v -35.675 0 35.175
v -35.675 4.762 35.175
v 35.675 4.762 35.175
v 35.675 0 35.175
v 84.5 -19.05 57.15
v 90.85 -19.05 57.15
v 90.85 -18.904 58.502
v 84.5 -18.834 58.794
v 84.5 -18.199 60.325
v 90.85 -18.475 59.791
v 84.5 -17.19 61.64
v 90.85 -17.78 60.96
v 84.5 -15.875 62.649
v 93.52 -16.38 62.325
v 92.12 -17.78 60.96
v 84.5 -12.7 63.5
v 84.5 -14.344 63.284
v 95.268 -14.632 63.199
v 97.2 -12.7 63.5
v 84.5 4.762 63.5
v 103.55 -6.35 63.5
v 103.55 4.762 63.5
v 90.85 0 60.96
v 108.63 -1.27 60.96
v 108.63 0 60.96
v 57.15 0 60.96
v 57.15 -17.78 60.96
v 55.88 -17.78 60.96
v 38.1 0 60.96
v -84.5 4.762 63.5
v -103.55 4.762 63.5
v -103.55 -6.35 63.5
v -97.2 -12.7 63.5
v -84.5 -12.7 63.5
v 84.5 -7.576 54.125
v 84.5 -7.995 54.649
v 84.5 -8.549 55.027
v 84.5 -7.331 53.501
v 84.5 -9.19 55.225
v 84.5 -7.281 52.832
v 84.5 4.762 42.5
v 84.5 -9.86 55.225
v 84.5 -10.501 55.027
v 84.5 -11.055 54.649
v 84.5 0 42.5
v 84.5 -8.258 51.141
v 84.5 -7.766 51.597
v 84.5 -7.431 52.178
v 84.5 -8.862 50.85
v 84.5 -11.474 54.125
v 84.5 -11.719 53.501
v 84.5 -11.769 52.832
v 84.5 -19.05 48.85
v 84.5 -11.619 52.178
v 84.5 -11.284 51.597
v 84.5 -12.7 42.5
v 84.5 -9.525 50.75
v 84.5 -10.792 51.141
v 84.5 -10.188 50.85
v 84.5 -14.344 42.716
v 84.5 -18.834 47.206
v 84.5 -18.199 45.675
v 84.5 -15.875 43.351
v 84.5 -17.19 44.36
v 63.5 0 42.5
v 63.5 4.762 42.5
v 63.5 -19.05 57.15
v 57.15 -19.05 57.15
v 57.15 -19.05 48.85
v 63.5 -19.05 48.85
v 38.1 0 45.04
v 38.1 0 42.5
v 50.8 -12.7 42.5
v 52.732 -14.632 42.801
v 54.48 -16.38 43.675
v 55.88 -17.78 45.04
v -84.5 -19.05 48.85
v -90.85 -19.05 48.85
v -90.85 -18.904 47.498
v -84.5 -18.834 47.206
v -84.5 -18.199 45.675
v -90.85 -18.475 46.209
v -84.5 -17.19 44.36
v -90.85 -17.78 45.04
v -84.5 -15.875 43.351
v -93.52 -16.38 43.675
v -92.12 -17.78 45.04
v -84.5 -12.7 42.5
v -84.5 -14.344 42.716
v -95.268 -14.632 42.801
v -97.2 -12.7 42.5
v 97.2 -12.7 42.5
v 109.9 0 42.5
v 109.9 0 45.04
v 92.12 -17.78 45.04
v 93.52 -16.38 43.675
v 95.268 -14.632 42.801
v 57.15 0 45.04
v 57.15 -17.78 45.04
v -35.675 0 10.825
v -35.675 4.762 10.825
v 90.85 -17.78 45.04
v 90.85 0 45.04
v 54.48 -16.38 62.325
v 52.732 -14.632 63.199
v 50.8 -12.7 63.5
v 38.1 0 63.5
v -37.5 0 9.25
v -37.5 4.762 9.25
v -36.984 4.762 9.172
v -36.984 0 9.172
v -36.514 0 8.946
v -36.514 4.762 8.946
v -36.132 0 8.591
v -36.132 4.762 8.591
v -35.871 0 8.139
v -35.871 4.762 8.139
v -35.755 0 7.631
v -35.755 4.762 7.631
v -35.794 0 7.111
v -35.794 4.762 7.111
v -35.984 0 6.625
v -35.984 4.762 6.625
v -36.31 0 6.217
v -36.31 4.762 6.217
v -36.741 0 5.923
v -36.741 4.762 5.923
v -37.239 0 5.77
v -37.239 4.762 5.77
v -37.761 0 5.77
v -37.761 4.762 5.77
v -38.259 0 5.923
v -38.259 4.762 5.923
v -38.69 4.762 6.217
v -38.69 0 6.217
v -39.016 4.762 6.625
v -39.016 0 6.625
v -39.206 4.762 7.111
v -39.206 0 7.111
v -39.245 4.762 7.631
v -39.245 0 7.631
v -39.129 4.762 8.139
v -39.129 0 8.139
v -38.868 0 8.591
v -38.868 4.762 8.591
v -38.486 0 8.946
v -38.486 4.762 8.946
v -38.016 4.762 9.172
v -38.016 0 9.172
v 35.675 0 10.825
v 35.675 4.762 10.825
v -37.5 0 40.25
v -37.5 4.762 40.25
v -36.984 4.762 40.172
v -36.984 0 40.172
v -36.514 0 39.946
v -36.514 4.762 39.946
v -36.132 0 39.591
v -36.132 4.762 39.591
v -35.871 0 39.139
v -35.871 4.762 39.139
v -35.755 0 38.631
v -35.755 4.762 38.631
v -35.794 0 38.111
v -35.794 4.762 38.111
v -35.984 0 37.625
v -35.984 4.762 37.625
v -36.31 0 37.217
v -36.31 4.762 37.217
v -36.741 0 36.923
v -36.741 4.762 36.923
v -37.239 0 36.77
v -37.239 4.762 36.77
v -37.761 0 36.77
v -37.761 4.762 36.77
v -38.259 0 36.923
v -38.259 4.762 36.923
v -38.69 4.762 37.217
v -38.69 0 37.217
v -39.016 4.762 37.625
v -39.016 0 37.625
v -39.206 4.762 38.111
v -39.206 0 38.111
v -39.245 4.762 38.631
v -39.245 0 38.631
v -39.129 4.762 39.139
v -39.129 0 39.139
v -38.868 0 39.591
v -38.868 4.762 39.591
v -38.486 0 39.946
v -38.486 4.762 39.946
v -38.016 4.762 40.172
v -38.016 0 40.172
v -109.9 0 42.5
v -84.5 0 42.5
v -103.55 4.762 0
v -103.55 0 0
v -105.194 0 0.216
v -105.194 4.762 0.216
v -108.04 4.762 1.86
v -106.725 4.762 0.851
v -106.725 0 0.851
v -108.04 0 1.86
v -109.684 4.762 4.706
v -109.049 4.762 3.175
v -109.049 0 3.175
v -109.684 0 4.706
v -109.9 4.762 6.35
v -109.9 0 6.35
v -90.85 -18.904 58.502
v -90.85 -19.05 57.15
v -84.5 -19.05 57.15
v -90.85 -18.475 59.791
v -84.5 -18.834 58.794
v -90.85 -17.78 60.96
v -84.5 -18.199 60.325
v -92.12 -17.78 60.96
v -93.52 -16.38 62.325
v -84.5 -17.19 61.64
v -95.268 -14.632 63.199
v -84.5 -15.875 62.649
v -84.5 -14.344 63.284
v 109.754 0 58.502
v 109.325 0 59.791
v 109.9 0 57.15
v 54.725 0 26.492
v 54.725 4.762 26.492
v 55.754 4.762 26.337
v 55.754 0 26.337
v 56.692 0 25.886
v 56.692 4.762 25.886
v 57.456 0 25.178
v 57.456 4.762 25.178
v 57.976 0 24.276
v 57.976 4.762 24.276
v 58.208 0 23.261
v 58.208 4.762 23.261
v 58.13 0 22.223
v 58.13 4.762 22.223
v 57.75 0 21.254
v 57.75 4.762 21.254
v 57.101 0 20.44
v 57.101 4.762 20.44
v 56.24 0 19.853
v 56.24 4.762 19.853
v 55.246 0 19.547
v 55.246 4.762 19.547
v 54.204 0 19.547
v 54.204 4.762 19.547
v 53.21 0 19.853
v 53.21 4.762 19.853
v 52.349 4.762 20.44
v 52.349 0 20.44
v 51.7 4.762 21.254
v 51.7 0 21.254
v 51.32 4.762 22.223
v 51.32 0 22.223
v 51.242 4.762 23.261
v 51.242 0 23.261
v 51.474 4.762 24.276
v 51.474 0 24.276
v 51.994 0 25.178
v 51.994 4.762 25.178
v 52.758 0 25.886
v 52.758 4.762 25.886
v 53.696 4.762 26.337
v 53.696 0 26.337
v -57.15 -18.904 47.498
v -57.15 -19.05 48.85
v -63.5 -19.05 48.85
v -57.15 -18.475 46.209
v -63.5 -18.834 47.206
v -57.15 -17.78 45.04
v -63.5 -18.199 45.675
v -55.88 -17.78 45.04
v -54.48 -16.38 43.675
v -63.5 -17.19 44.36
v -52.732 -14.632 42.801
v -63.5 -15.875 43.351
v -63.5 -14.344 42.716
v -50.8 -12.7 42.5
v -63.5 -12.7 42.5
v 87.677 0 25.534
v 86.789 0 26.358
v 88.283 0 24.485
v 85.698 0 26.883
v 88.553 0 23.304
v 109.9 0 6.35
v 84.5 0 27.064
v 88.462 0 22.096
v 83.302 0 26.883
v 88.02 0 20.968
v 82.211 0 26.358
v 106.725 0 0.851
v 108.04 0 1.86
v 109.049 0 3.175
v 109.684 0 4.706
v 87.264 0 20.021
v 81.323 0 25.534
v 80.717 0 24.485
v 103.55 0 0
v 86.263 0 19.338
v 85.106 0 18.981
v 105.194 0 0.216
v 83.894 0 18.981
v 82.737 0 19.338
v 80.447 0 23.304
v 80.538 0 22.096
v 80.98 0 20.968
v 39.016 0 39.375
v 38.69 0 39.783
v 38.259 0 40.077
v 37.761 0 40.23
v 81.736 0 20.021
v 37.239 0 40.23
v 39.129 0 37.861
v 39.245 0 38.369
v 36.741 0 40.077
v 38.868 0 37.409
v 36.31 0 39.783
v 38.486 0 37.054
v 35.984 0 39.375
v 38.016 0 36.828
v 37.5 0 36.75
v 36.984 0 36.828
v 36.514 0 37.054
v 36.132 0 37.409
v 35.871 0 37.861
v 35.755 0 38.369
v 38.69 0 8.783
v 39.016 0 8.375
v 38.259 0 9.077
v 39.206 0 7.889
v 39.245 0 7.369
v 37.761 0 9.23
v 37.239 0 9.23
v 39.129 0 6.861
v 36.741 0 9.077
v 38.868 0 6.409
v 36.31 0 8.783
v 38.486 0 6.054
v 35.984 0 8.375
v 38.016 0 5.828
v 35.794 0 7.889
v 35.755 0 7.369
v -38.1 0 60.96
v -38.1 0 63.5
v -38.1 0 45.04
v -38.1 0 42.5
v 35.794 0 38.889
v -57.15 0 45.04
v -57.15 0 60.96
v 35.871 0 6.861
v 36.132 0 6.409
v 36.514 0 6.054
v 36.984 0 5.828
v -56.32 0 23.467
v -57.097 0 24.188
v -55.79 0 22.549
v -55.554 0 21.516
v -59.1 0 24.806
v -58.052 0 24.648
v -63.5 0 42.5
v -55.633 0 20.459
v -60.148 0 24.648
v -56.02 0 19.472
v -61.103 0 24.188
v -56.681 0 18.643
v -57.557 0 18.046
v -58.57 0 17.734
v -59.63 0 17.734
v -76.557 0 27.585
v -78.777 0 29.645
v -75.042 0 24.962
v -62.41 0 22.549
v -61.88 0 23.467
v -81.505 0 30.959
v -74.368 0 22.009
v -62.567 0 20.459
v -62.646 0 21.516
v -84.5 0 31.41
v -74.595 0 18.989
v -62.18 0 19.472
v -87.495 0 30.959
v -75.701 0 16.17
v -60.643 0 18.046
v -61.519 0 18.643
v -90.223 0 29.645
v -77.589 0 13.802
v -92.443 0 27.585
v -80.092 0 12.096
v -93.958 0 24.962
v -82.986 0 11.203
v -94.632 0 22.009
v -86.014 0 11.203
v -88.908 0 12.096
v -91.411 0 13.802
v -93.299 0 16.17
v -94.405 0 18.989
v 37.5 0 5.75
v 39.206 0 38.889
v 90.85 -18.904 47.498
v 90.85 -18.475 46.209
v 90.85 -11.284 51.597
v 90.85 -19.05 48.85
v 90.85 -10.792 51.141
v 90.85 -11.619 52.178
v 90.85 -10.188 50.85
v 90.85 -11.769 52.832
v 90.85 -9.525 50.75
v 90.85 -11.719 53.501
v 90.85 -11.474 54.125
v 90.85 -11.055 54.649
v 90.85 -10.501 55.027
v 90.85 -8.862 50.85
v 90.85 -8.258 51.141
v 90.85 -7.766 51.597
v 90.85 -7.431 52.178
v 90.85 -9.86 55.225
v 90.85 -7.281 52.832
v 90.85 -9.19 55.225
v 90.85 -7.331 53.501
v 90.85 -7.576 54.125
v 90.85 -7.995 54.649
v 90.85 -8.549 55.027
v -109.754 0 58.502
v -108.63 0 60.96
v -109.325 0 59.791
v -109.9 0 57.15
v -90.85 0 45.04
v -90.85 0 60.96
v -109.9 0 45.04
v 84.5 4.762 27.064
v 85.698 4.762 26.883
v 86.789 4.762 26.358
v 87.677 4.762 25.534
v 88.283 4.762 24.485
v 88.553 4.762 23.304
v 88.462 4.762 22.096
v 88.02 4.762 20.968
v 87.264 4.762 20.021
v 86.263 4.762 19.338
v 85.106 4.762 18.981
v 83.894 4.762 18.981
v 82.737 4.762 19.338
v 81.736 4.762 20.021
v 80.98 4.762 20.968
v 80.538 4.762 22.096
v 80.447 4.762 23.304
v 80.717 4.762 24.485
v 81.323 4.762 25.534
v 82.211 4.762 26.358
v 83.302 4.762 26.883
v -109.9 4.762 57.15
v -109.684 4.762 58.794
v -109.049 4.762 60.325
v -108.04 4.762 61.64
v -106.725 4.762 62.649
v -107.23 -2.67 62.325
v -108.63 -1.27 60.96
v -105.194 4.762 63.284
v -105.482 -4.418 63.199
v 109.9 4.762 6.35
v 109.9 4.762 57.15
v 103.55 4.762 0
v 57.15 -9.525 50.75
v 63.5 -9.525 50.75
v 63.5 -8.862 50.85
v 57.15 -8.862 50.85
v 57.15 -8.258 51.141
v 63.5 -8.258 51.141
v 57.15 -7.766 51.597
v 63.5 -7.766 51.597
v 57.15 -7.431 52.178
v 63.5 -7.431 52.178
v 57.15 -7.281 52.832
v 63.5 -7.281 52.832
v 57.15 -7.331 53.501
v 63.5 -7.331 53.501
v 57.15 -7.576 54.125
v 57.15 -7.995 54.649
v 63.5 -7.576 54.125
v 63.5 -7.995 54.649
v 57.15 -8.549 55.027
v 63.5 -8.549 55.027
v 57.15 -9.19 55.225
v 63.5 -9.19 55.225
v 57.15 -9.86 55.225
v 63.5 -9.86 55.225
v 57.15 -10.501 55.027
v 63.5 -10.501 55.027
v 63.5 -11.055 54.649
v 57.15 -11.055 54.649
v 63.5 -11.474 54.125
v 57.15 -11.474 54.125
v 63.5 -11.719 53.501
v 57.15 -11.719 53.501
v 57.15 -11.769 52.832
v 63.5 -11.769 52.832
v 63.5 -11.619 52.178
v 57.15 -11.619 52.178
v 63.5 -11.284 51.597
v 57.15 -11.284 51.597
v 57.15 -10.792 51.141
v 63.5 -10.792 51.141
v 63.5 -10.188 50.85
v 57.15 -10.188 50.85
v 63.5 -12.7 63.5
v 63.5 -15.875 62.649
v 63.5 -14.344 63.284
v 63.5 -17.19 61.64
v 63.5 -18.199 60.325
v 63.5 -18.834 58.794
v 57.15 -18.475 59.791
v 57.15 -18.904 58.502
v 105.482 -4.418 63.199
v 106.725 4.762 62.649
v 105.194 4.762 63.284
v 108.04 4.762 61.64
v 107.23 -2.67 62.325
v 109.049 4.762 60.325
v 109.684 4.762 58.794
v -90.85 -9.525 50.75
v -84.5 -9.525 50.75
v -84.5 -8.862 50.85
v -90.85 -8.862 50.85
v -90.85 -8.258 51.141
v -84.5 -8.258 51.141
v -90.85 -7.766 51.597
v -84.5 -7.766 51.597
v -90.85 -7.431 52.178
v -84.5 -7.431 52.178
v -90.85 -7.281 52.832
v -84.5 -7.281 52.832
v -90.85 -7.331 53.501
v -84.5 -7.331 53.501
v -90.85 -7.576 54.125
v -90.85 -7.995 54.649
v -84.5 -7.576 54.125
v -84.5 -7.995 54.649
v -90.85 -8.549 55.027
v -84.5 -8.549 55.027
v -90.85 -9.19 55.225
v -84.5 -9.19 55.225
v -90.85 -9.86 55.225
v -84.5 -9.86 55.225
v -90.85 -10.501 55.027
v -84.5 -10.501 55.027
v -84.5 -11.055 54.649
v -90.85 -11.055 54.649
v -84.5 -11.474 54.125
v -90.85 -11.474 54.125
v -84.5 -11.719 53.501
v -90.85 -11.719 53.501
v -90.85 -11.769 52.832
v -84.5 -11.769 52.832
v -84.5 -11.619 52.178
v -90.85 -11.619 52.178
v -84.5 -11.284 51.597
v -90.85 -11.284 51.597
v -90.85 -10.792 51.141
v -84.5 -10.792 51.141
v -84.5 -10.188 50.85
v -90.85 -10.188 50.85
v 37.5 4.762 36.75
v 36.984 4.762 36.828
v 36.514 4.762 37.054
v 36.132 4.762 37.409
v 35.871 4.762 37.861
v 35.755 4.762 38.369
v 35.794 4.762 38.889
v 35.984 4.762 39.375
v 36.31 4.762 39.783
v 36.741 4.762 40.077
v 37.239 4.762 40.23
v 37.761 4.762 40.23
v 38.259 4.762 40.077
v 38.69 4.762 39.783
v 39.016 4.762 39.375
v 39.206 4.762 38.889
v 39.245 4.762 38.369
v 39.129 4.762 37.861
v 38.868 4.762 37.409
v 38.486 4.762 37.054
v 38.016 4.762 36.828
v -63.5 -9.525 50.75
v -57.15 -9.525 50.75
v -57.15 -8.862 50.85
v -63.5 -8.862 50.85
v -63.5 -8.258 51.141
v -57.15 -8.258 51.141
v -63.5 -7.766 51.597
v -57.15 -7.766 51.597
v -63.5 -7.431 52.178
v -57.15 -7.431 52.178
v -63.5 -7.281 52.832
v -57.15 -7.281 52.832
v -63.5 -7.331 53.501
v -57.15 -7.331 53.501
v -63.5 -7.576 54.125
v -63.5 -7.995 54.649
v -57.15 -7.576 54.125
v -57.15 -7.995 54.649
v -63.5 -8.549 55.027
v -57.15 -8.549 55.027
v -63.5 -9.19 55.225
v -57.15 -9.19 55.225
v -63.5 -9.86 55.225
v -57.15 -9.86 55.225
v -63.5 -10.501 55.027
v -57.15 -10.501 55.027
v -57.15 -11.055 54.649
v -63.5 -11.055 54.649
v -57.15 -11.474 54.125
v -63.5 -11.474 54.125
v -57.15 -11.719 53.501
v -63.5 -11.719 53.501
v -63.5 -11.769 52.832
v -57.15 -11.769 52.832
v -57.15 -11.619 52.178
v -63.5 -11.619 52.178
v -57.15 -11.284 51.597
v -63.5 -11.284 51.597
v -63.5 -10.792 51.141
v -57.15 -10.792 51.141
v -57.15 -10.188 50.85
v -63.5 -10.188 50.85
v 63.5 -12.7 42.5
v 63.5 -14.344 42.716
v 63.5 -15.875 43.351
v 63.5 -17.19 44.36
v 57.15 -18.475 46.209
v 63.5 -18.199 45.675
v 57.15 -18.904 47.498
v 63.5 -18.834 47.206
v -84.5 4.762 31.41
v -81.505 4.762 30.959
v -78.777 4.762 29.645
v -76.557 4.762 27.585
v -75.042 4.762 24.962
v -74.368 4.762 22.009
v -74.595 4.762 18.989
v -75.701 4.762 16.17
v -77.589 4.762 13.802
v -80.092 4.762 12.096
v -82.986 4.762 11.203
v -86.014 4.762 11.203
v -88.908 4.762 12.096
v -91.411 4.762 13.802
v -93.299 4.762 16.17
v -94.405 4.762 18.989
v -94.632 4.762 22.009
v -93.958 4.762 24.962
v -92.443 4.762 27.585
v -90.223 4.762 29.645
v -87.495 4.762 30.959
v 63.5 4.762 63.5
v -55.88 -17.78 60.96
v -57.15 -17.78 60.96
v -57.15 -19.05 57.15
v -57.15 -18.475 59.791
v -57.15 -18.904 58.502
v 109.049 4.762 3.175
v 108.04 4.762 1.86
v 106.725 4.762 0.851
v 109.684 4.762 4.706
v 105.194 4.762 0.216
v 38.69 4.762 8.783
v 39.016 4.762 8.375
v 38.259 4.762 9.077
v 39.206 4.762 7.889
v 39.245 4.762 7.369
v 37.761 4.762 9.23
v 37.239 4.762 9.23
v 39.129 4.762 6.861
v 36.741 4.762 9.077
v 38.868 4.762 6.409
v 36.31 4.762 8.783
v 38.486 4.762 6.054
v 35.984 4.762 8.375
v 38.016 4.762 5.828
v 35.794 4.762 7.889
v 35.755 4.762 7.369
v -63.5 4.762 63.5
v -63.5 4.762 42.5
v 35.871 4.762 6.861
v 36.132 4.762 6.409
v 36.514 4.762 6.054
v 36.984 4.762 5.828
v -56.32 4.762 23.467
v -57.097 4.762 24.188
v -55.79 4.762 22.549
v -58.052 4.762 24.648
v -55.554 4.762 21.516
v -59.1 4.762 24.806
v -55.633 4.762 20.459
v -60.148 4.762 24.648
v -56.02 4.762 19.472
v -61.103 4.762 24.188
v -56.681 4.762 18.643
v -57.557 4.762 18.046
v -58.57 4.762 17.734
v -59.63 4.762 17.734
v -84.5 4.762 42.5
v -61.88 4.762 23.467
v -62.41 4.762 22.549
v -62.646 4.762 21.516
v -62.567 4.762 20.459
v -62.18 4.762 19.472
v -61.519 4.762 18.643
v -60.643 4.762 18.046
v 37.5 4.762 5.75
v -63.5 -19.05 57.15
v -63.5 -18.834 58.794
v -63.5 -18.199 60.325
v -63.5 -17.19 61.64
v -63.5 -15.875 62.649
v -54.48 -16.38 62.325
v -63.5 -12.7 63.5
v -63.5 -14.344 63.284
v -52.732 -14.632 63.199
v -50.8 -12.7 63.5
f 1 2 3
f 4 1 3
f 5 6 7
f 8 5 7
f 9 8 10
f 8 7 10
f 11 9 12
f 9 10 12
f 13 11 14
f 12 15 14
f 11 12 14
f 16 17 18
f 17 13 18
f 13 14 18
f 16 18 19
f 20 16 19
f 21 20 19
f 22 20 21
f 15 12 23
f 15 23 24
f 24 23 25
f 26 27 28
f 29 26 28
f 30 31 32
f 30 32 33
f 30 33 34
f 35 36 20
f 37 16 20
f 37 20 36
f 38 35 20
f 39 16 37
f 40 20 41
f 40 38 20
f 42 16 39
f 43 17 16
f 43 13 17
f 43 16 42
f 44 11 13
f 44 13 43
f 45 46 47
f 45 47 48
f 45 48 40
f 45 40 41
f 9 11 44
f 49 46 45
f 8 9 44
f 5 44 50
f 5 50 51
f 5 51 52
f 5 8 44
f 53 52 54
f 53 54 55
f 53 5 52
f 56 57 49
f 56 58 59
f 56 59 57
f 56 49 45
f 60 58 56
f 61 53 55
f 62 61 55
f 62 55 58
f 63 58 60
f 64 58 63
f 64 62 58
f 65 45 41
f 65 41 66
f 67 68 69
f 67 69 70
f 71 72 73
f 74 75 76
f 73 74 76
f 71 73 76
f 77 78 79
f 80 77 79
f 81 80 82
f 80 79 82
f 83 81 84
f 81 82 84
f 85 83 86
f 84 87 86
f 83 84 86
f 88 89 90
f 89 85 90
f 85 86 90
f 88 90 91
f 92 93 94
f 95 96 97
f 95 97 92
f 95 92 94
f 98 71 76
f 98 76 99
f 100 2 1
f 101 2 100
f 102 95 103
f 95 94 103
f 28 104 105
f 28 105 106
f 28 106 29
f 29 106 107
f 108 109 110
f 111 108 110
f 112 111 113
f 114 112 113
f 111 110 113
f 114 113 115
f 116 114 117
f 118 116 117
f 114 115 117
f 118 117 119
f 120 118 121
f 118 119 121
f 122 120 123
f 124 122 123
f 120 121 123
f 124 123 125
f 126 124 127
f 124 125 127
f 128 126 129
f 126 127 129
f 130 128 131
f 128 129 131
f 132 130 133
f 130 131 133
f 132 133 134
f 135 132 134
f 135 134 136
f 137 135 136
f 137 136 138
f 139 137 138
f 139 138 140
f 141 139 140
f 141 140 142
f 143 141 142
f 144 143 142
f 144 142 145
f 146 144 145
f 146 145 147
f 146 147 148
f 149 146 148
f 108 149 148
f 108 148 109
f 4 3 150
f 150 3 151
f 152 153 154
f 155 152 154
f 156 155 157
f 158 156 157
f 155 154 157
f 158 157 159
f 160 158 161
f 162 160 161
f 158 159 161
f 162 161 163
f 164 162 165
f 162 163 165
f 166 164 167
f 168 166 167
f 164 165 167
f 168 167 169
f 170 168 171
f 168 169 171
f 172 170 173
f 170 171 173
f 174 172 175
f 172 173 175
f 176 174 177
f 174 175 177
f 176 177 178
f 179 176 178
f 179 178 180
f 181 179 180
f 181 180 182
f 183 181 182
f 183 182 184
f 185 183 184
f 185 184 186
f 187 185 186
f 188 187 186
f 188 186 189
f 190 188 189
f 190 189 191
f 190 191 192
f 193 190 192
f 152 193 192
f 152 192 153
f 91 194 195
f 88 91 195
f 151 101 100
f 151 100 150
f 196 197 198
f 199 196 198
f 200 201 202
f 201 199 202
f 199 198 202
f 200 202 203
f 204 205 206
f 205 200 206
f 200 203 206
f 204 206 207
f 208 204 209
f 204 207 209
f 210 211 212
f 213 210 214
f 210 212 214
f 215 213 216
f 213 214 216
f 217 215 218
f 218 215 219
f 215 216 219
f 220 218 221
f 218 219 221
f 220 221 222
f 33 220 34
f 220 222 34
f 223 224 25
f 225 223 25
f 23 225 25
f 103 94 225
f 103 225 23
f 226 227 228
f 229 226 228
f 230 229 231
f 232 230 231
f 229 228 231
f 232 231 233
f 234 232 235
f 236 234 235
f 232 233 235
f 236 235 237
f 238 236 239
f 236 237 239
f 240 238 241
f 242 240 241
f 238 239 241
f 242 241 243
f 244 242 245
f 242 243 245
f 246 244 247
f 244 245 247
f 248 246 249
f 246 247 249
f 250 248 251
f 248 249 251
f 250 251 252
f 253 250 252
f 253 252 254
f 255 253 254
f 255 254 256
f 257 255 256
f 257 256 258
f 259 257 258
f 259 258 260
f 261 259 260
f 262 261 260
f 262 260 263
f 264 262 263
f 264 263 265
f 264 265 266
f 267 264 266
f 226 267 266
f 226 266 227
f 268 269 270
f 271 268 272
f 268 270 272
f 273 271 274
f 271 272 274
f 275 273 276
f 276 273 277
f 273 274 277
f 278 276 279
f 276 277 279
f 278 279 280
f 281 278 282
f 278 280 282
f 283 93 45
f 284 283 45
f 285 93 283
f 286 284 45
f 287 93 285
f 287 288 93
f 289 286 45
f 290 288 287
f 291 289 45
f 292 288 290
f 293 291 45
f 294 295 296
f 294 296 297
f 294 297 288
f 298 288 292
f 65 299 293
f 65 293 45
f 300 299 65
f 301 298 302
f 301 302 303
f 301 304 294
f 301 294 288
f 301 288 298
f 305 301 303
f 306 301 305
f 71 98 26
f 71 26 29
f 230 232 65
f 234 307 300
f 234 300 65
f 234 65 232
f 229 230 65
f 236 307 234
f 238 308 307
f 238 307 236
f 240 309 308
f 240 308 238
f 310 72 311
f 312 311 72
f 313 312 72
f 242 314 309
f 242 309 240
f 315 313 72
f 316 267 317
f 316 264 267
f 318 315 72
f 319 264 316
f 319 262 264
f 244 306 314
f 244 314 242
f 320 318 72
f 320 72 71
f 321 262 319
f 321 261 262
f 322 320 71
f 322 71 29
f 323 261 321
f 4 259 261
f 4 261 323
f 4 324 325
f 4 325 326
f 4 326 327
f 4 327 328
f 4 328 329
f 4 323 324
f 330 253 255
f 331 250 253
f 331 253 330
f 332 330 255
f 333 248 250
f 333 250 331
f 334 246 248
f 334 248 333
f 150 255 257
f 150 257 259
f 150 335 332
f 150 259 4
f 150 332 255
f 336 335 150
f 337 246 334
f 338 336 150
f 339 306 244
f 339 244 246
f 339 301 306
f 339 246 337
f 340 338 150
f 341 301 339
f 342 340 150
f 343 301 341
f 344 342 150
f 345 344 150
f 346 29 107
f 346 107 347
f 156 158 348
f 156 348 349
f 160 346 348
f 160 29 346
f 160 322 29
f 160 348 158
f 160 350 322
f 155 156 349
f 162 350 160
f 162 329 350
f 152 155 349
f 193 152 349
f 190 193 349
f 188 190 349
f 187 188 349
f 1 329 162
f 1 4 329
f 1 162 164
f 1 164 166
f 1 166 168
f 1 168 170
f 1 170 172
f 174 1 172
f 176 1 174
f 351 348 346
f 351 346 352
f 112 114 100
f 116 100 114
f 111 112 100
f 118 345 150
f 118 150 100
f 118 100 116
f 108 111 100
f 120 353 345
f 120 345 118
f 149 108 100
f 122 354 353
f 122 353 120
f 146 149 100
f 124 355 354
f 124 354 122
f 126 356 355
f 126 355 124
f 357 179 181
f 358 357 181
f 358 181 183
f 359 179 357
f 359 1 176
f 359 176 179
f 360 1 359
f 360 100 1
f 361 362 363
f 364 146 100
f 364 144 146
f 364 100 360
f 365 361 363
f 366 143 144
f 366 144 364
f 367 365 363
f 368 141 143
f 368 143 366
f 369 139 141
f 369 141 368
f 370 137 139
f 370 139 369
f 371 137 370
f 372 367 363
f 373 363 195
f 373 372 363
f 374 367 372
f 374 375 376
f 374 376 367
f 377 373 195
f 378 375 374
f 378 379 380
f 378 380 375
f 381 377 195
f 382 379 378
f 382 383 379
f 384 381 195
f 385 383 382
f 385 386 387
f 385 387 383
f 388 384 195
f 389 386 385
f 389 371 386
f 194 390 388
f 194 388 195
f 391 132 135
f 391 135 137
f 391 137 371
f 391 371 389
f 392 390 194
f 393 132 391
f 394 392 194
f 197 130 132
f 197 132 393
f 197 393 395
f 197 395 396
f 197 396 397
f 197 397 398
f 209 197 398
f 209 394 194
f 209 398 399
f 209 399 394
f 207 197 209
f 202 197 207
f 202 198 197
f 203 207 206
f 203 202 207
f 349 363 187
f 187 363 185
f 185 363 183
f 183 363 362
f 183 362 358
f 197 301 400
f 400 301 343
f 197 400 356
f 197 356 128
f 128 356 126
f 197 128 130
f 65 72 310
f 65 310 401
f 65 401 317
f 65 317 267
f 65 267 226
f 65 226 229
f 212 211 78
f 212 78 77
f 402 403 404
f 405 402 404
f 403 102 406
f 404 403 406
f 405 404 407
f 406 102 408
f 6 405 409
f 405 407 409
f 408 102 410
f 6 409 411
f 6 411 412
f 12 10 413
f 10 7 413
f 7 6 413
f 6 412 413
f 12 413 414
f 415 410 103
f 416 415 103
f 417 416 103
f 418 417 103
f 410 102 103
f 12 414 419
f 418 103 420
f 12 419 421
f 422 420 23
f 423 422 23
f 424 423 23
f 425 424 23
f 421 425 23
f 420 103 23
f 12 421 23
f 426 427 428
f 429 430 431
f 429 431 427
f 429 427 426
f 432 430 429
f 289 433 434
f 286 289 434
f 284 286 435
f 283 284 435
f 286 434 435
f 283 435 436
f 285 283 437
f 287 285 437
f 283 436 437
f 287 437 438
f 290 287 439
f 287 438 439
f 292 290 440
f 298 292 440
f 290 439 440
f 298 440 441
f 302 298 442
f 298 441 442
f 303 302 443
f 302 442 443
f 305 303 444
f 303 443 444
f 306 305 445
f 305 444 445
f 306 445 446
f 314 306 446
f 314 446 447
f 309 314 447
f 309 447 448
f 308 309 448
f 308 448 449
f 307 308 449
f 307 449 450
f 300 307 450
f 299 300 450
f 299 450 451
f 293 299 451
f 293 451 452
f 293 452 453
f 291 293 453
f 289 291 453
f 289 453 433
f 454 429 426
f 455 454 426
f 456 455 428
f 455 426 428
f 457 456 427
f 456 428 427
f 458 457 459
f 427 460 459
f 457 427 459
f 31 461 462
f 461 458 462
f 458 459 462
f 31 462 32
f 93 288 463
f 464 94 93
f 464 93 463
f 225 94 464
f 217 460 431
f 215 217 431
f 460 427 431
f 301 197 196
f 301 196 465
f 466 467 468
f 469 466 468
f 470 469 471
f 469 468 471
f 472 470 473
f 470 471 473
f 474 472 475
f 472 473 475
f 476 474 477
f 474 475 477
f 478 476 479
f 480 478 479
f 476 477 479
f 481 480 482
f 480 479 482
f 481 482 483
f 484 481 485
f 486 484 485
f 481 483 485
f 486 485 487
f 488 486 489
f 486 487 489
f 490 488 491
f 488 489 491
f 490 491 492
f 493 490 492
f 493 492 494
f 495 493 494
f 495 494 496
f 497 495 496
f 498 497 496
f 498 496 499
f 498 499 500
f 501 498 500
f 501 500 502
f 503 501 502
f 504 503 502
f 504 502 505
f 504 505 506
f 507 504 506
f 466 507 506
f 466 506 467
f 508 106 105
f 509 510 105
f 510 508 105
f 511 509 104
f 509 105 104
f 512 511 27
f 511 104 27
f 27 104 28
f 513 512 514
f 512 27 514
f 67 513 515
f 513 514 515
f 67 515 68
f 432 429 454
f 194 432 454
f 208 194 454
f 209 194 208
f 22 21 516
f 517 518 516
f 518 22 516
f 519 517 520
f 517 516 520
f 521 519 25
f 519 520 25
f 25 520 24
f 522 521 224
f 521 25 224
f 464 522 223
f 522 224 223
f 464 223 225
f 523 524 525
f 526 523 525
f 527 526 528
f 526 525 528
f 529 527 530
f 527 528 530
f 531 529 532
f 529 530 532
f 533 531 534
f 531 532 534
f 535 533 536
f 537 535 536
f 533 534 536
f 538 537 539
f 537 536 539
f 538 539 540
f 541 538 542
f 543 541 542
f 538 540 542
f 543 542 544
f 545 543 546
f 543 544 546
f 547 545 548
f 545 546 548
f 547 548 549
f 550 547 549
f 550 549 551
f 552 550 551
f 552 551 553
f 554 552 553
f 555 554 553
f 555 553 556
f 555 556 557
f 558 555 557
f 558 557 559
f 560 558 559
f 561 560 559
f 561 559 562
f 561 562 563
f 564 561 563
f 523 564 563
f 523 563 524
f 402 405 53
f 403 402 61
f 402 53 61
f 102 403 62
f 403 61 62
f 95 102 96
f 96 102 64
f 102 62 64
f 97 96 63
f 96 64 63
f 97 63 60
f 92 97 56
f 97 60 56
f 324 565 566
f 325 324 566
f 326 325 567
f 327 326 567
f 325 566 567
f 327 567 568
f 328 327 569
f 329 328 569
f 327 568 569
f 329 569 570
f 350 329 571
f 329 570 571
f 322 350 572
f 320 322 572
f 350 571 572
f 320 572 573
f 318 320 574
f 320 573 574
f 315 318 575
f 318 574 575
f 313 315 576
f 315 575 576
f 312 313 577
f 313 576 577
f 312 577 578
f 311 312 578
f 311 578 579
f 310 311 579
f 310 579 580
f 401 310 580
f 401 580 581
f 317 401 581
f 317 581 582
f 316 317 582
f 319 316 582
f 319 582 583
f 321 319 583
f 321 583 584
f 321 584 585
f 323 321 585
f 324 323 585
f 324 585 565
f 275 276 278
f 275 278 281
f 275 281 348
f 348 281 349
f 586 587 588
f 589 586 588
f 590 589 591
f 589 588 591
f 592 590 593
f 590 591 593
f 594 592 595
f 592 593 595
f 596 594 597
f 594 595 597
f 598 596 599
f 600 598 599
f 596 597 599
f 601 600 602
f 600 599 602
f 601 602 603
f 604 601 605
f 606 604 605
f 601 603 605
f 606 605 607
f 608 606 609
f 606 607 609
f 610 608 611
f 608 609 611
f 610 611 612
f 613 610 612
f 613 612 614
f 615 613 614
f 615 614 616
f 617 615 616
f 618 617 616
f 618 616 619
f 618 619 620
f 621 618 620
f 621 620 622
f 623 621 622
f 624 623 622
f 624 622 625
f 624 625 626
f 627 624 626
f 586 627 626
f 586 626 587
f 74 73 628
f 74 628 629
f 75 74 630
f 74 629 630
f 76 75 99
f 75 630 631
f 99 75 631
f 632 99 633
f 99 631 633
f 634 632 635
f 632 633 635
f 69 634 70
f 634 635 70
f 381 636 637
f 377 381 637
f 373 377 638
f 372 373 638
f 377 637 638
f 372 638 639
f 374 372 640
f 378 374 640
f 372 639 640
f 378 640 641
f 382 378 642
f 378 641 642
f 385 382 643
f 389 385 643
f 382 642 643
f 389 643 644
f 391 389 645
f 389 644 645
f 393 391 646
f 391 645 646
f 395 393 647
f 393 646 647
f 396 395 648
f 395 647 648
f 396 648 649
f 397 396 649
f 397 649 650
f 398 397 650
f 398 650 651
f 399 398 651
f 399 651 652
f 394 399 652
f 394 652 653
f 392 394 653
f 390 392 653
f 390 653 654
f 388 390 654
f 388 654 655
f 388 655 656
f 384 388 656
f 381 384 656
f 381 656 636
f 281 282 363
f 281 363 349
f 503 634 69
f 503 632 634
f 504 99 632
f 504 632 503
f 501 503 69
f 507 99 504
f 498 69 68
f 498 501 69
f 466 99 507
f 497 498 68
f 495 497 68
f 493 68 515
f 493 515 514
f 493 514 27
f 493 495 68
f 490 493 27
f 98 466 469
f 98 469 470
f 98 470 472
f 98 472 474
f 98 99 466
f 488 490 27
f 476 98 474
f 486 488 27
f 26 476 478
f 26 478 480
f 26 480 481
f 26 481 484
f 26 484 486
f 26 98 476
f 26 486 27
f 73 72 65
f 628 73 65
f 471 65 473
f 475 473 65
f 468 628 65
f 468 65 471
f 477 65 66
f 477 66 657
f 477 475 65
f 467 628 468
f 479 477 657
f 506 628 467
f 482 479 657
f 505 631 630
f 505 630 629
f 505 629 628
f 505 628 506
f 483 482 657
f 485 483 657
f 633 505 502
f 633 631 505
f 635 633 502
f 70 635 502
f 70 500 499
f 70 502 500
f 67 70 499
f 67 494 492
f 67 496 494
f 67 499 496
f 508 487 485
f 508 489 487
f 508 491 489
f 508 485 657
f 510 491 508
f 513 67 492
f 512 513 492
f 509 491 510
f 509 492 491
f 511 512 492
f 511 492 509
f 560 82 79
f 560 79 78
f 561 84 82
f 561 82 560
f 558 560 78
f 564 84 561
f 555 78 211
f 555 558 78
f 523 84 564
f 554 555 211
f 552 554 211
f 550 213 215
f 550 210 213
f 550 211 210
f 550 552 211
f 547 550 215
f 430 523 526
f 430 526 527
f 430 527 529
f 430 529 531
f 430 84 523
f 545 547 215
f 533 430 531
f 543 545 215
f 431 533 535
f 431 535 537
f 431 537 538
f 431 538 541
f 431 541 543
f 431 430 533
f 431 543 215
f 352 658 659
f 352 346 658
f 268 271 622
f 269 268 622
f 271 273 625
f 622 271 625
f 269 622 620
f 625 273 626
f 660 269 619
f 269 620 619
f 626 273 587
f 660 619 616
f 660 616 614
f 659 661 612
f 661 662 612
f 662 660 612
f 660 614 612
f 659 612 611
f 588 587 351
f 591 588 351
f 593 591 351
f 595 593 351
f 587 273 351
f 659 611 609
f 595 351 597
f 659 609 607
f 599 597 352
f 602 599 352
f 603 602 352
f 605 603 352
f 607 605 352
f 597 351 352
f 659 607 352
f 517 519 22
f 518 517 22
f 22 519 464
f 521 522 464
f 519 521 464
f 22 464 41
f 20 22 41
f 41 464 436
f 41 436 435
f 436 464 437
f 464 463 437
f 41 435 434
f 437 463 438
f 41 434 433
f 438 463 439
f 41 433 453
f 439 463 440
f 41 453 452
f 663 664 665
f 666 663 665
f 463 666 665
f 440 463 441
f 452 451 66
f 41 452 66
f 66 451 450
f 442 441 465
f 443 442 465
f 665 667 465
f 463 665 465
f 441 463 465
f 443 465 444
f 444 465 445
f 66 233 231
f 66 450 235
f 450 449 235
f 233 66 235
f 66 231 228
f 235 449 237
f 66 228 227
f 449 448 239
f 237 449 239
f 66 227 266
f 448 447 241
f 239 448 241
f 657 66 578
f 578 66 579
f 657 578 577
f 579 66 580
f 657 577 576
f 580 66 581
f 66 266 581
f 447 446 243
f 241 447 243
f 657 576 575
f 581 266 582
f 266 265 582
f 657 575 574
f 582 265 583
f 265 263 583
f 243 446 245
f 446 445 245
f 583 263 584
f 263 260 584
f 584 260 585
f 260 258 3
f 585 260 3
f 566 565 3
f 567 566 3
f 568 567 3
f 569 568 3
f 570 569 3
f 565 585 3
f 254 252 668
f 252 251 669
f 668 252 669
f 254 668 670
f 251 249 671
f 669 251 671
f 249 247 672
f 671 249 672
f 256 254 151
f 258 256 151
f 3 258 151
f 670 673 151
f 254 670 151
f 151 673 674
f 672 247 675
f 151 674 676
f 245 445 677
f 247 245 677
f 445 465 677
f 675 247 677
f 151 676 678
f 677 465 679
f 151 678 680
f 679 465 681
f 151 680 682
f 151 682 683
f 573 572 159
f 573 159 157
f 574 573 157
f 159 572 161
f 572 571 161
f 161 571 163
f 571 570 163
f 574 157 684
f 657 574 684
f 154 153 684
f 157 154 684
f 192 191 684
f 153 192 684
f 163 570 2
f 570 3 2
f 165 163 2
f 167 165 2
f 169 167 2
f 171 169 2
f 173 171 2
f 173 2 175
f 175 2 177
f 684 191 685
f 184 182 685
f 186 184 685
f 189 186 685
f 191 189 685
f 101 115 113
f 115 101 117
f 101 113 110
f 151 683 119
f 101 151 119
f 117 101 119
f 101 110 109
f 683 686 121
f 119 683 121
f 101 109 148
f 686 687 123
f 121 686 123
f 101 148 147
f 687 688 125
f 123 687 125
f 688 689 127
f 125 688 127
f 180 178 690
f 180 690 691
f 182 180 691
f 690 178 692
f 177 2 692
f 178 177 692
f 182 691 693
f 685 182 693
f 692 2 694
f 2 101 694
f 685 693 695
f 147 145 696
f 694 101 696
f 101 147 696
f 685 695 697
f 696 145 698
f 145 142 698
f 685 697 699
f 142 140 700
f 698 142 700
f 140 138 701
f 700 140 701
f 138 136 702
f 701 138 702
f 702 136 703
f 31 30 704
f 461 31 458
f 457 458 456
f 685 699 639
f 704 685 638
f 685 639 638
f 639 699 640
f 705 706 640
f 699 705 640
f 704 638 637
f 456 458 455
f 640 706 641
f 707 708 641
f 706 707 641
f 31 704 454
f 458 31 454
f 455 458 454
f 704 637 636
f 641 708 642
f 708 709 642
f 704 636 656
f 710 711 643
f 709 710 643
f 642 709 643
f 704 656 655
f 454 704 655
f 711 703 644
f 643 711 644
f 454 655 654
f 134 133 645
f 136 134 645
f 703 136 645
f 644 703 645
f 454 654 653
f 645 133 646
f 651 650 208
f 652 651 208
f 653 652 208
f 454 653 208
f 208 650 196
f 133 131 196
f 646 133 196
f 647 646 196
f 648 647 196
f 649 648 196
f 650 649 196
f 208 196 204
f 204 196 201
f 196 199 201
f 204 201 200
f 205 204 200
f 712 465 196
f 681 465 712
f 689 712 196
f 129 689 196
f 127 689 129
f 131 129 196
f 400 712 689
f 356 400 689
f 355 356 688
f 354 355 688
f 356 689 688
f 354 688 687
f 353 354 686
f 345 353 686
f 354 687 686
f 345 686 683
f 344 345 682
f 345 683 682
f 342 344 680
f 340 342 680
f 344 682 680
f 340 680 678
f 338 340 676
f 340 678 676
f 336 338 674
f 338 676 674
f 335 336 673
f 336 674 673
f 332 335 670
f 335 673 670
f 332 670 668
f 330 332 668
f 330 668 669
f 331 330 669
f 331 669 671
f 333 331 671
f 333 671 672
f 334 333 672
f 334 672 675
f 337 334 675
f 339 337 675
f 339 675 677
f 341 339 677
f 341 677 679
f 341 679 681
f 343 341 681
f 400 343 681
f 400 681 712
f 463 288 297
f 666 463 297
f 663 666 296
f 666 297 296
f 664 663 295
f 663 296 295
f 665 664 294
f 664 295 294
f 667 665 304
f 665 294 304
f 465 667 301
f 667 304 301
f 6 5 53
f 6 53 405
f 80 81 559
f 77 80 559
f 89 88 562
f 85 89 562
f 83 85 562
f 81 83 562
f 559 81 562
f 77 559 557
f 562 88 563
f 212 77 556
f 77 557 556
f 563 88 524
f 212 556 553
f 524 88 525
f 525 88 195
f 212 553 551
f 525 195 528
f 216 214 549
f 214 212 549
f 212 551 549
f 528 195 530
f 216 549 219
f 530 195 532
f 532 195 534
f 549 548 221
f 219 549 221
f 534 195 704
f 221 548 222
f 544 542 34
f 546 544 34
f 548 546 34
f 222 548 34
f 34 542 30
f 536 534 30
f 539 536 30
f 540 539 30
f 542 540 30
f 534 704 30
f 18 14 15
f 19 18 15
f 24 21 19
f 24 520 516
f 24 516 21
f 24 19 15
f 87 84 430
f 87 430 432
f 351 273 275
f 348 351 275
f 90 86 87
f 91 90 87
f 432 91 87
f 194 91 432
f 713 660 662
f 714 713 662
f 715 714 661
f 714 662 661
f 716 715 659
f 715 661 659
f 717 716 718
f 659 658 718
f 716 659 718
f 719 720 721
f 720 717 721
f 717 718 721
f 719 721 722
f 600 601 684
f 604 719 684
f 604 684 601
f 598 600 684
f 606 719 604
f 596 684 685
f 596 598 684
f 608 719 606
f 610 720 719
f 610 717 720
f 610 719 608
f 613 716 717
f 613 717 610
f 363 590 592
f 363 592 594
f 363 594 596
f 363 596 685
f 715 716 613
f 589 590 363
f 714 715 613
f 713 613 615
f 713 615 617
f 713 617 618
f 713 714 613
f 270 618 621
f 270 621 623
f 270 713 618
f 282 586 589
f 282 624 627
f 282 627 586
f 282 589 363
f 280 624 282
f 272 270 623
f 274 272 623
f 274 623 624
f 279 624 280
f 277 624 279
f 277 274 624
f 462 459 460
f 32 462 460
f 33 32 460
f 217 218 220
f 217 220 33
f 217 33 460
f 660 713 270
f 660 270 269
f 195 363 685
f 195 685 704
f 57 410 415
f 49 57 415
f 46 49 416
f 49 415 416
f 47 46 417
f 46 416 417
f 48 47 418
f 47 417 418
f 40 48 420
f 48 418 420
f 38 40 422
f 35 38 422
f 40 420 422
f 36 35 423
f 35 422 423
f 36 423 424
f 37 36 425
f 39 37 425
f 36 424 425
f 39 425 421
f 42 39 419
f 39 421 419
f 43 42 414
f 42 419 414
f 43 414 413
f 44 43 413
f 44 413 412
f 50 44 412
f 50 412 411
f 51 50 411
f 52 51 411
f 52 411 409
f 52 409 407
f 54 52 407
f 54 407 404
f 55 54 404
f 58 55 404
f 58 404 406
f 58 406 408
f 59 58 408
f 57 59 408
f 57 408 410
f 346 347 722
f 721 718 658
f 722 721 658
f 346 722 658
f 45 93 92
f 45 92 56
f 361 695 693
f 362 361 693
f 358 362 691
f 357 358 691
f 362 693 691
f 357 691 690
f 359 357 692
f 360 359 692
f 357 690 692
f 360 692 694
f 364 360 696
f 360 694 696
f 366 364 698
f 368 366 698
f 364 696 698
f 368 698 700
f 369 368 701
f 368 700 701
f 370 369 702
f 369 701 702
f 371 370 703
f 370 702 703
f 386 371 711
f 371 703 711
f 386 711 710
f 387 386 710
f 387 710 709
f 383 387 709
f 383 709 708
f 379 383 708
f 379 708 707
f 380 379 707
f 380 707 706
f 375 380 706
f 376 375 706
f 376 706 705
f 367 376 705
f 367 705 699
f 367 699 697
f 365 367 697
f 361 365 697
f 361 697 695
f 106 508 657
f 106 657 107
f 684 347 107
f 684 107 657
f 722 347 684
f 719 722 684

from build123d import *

# Parameters (mm, degrees)
BOSS_EXTRUDE1_DEPTH = 4.7625
CUT_EXTRUDE1_REACH  = 129.016
SKETCH3_R           = 10.16
SKETCH3_R_2         = 3.556
SKETCH3_R_3         = 1.75
SKETCH3_R_4         = 3.4925
SKETCH3_R_5         = 4.064
SKETCH3_W           = 71.35
SKETCH3_H           = 24.35
SKETCH4_W           = 6.35
SKETCH4_H           = 21
BOSS_EXTRUDE2_DEPTH = 19.05
SKETCH5_R           = 2.25
CUT_EXTRUDE2_DEPTH  = 212.413611199
BOSS_EXTRUDE3_DEPTH = 2.54
BOSS_EXTRUDE4_DEPTH = 2.54
FILLET1_R           = 6.35


with BuildPart() as part:
    # Sketch2 → Boss-Extrude1 (new body)
    with BuildSketch(Plane(origin=(0, 0, 0), x_dir=(1, 0, 0), z_dir=(0, 1, 0))):
        Polygon((-109.9, 0), (109.9, 0), (109.9, -63.5), (84.5, -63.5), (84.5, -42.5), (63.5, -42.5), (63.5, -63.5), (-63.5, -63.5), (-63.5, -42.5), (-84.5, -42.5), (-84.5, -63.5), (-109.9, -63.5), align=None)
    extrude(amount=BOSS_EXTRUDE1_DEPTH)

    # Sketch3 → Cut-Extrude1 (cut, up to next)
    with BuildSketch(Plane(origin=(0, 4.7625, 0), x_dir=(1, 0, 0), z_dir=(0, 1, 0)), mode=Mode.PRIVATE) as cut_extrude1_sk1:
        with Locations(Location((-84.5, -21.25, 0), (0, 0, 270))):
            Circle(SKETCH3_R)
    cut_extrude1_tool1 = extrude(cut_extrude1_sk1.sketch, amount=-CUT_EXTRUDE1_REACH, mode=Mode.PRIVATE) & part.part
    # Sketch3 → Cut-Extrude1 (cut, up to next)
    with BuildSketch(Plane(origin=(0, 4.7625, 0), x_dir=(1, 0, 0), z_dir=(0, 1, 0)), mode=Mode.PRIVATE) as cut_extrude1_sk2:
        with Locations(Location((-59.1, -21.25, 0), (0, 0, 270))):
            Circle(SKETCH3_R_2)
    cut_extrude1_tool2 = extrude(cut_extrude1_sk2.sketch, amount=-CUT_EXTRUDE1_REACH, mode=Mode.PRIVATE) & part.part
    # Sketch3 → Cut-Extrude1 (cut, up to next)
    with BuildSketch(Plane(origin=(0, 4.7625, 0), x_dir=(1, 0, 0), z_dir=(0, 1, 0)), mode=Mode.PRIVATE) as cut_extrude1_sk3:
        with Locations(Location((-37.5, -38.5, 0), (0, 0, 270))):
            Circle(SKETCH3_R_3)
    cut_extrude1_tool3 = extrude(cut_extrude1_sk3.sketch, amount=-CUT_EXTRUDE1_REACH, mode=Mode.PRIVATE) & part.part
    # Sketch3 → Cut-Extrude1 (cut, up to next)
    with BuildSketch(Plane(origin=(0, 4.7625, 0), x_dir=(1, 0, 0), z_dir=(0, 1, 0)), mode=Mode.PRIVATE) as cut_extrude1_sk4:
        with Locations(Location((-37.5, -7.5, 0), (0, 0, 270))):
            Circle(SKETCH3_R_3)
    cut_extrude1_tool4 = extrude(cut_extrude1_sk4.sketch, amount=-CUT_EXTRUDE1_REACH, mode=Mode.PRIVATE) & part.part
    # Sketch3 → Cut-Extrude1 (cut, up to next)
    with BuildSketch(Plane(origin=(0, 4.7625, 0), x_dir=(1, 0, 0), z_dir=(0, 1, 0)), mode=Mode.PRIVATE) as cut_extrude1_sk5:
        with Locations(Location((37.5, -38.5, 0), (0, 0, 90))):
            Circle(SKETCH3_R_3)
    cut_extrude1_tool5 = extrude(cut_extrude1_sk5.sketch, amount=-CUT_EXTRUDE1_REACH, mode=Mode.PRIVATE) & part.part
    # Sketch3 → Cut-Extrude1 (cut, up to next)
    with BuildSketch(Plane(origin=(0, 4.7625, 0), x_dir=(1, 0, 0), z_dir=(0, 1, 0)), mode=Mode.PRIVATE) as cut_extrude1_sk6:
        with Locations(Location((37.5, -7.5, 0), (0, 0, 90))):
            Circle(SKETCH3_R_3)
    cut_extrude1_tool6 = extrude(cut_extrude1_sk6.sketch, amount=-CUT_EXTRUDE1_REACH, mode=Mode.PRIVATE) & part.part
    # Sketch3 → Cut-Extrude1 (cut, up to next)
    with BuildSketch(Plane(origin=(0, 4.7625, 0), x_dir=(1, 0, 0), z_dir=(0, 1, 0)), mode=Mode.PRIVATE) as cut_extrude1_sk7:
        with Locations(Location((54.725, -23, 0), (0, 0, 270))):
            Circle(SKETCH3_R_4)
    cut_extrude1_tool7 = extrude(cut_extrude1_sk7.sketch, amount=-CUT_EXTRUDE1_REACH, mode=Mode.PRIVATE) & part.part
    # Sketch3 → Cut-Extrude1 (cut, up to next)
    with BuildSketch(Plane(origin=(0, 4.7625, 0), x_dir=(1, 0, 0), z_dir=(0, 1, 0)), mode=Mode.PRIVATE) as cut_extrude1_sk8:
        with Locations(Location((84.5, -23, 0), (0, 0, 270))):
            Circle(SKETCH3_R_5)
    cut_extrude1_tool8 = extrude(cut_extrude1_sk8.sketch, amount=-CUT_EXTRUDE1_REACH, mode=Mode.PRIVATE) & part.part
    # Sketch3 → Cut-Extrude1 (cut, up to next)
    with BuildSketch(Plane(origin=(0, 4.7625, 0), x_dir=(1, 0, 0), z_dir=(0, 1, 0)), mode=Mode.PRIVATE) as cut_extrude1_sk9:
        with Locations((0, -23)):
            Rectangle(SKETCH3_W, SKETCH3_H)
    cut_extrude1_tool9 = extrude(cut_extrude1_sk9.sketch, amount=-CUT_EXTRUDE1_REACH, mode=Mode.PRIVATE) & part.part
    add(cut_extrude1_tool1.solids().sort_by_distance((-84.5, 4.7625, 21.25))[0], mode=Mode.SUBTRACT)
    add(cut_extrude1_tool2.solids().sort_by_distance((-59.1, 4.7625, 21.25))[0], mode=Mode.SUBTRACT)
    add(cut_extrude1_tool3.solids().sort_by_distance((-37.5, 4.7625, 38.5))[0], mode=Mode.SUBTRACT)
    add(cut_extrude1_tool4.solids().sort_by_distance((-37.5, 4.7625, 7.5))[0], mode=Mode.SUBTRACT)
    add(cut_extrude1_tool5.solids().sort_by_distance((37.5, 4.7625, 38.5))[0], mode=Mode.SUBTRACT)
    add(cut_extrude1_tool6.solids().sort_by_distance((37.5, 4.7625, 7.5))[0], mode=Mode.SUBTRACT)
    add(cut_extrude1_tool7.solids().sort_by_distance((54.725, 4.7625, 23))[0], mode=Mode.SUBTRACT)
    add(cut_extrude1_tool8.solids().sort_by_distance((84.5, 4.7625, 23))[0], mode=Mode.SUBTRACT)
    add(cut_extrude1_tool9.solids().sort_by_distance((0, 4.7625, 23))[0], mode=Mode.SUBTRACT)

    # Sketch4 → Boss-Extrude2 (add)
    with BuildSketch(Plane.XZ):
        with Locations((-87.675, 53)):
            Rectangle(SKETCH4_W, SKETCH4_H)
        with Locations((87.675, 53)):
            Rectangle(SKETCH4_W, SKETCH4_H)
        with Locations((-60.325, 53)):
            Rectangle(SKETCH4_W, SKETCH4_H)
        with Locations((60.325, 53)):
            Rectangle(SKETCH4_W, SKETCH4_H)
    extrude(amount=BOSS_EXTRUDE2_DEPTH)

    # Sketch5 → Cut-Extrude2 (cut, through all)
    with BuildSketch(Plane(origin=(90.85, 0, 0), x_dir=(0, 0, -1), z_dir=(1, 0, 0))):
        with Locations((-53, -9.525)):
            Circle(SKETCH5_R)
    extrude(amount=-CUT_EXTRUDE2_DEPTH, mode=Mode.SUBTRACT)

    # Sketch6 → Boss-Extrude3 (add)
    with BuildSketch(Plane.XY.offset(63.5)):
        Polygon((90.85, -19.05), (109.9, 0), (90.85, 0), align=None)
        Polygon((57.15, -19.05), (38.1, 0), (57.15, 0), align=None)
        Polygon((-90.85, -19.05), (-90.85, 0), (-109.9, 0), align=None)
        Polygon((-57.15, -19.05), (-57.15, 0), (-38.1, 0), align=None)
    extrude(amount=-BOSS_EXTRUDE3_DEPTH)

    # Sketch7 → Boss-Extrude4 (add)
    with BuildSketch(Plane(origin=(0, 0, 42.5), x_dir=(-1, 0, 0), z_dir=(0, 0, -1))):
        Polygon((-90.85, -19.05), (-90.85, 0), (-109.9, 0), align=None)
        Polygon((-57.15, 0), (-38.1, 0), (-57.15, -19.05), align=None)
        Polygon((57.15, 0), (57.15, -19.05), (38.1, 0), align=None)
        Polygon((90.85, 0), (90.85, -19.05), (109.9, 0), align=None)
    extrude(amount=-BOSS_EXTRUDE4_DEPTH)

    # Fillet1
    # the kernel refuses this fillet: 6.35 mm, written as the material it takes off along each edge
    with BuildSketch(Plane(origin=(-79.375, -19.05, 42.5), x_dir=(0, 1, 0), z_dir=(1, 0, 0)), Plane(origin=(-41.275, -19.05, 63.5), x_dir=(0, 1, 0), z_dir=(-1, 0, 0)), Plane(origin=(79.375, -19.05, 42.5), x_dir=(0, 0, 1), z_dir=(-1, 0, 0)), Plane(origin=(68.625, -19.05, 42.5), x_dir=(0, 1, 0), z_dir=(1, 0, 0))) as fillet1_piece_1:
        with BuildLine():
            CenterArc((FILLET1_R, FILLET1_R), FILLET1_R, 180, 90)
            Line((0, FILLET1_R), (0, 0))
            Line((0, 0), (FILLET1_R, 0))
        make_face()
    extrude(amount=38.1, mode=Mode.SUBTRACT)
    with BuildSketch(Plane(origin=(41.275, -19.05, 63.5), x_dir=(0, 1, 0), z_dir=(1, 0, 0)), Plane(origin=(-68.625, -19.05, 63.5), x_dir=(0, 0, -1), z_dir=(-1, 0, 0)), Plane(origin=(-106.725, -19.05, 42.5), x_dir=(0, 0, 1), z_dir=(1, 0, 0)), Plane(origin=(106.725, -19.05, 63.5), x_dir=(0, 0, -1), z_dir=(-1, 0, 0))) as fillet1_piece_2:
        with BuildLine():
            CenterArc((FILLET1_R, -FILLET1_R), FILLET1_R, 90, 90)
            Line((0, -FILLET1_R), (0, 0))
            Line((0, 0), (FILLET1_R, 0))
        make_face()
    extrude(amount=38.1, mode=Mode.SUBTRACT)
    with BuildSketch(Plane(origin=(109.9, -15.875, 63.5), x_dir=(-1, 0, 0), z_dir=(0, 1, 0)), Plane(origin=(-109.9, -15.875, 0), x_dir=(1, 0, 0), z_dir=(0, 1, 0))) as fillet1_piece_3:
        with BuildLine():
            CenterArc((FILLET1_R, -FILLET1_R), FILLET1_R, 90, 90)
            Line((0, -FILLET1_R), (0, 0))
            Line((0, 0), (FILLET1_R, 0))
        make_face()
    extrude(amount=36.5125, mode=Mode.SUBTRACT)
    with BuildSketch(Plane(origin=(-109.9, -15.875, 63.5), x_dir=(1, 0, 0), z_dir=(0, 1, 0)), Plane(origin=(109.9, -15.875, 0), x_dir=(-1, 0, 0), z_dir=(0, 1, 0))) as fillet1_piece_4:
        with BuildLine():
            CenterArc((FILLET1_R, FILLET1_R), FILLET1_R, 180, 90)
            Line((0, FILLET1_R), (0, 0))
            Line((0, 0), (FILLET1_R, 0))
        make_face()
    extrude(amount=36.5125, mode=Mode.SUBTRACT)


solid = part.part
